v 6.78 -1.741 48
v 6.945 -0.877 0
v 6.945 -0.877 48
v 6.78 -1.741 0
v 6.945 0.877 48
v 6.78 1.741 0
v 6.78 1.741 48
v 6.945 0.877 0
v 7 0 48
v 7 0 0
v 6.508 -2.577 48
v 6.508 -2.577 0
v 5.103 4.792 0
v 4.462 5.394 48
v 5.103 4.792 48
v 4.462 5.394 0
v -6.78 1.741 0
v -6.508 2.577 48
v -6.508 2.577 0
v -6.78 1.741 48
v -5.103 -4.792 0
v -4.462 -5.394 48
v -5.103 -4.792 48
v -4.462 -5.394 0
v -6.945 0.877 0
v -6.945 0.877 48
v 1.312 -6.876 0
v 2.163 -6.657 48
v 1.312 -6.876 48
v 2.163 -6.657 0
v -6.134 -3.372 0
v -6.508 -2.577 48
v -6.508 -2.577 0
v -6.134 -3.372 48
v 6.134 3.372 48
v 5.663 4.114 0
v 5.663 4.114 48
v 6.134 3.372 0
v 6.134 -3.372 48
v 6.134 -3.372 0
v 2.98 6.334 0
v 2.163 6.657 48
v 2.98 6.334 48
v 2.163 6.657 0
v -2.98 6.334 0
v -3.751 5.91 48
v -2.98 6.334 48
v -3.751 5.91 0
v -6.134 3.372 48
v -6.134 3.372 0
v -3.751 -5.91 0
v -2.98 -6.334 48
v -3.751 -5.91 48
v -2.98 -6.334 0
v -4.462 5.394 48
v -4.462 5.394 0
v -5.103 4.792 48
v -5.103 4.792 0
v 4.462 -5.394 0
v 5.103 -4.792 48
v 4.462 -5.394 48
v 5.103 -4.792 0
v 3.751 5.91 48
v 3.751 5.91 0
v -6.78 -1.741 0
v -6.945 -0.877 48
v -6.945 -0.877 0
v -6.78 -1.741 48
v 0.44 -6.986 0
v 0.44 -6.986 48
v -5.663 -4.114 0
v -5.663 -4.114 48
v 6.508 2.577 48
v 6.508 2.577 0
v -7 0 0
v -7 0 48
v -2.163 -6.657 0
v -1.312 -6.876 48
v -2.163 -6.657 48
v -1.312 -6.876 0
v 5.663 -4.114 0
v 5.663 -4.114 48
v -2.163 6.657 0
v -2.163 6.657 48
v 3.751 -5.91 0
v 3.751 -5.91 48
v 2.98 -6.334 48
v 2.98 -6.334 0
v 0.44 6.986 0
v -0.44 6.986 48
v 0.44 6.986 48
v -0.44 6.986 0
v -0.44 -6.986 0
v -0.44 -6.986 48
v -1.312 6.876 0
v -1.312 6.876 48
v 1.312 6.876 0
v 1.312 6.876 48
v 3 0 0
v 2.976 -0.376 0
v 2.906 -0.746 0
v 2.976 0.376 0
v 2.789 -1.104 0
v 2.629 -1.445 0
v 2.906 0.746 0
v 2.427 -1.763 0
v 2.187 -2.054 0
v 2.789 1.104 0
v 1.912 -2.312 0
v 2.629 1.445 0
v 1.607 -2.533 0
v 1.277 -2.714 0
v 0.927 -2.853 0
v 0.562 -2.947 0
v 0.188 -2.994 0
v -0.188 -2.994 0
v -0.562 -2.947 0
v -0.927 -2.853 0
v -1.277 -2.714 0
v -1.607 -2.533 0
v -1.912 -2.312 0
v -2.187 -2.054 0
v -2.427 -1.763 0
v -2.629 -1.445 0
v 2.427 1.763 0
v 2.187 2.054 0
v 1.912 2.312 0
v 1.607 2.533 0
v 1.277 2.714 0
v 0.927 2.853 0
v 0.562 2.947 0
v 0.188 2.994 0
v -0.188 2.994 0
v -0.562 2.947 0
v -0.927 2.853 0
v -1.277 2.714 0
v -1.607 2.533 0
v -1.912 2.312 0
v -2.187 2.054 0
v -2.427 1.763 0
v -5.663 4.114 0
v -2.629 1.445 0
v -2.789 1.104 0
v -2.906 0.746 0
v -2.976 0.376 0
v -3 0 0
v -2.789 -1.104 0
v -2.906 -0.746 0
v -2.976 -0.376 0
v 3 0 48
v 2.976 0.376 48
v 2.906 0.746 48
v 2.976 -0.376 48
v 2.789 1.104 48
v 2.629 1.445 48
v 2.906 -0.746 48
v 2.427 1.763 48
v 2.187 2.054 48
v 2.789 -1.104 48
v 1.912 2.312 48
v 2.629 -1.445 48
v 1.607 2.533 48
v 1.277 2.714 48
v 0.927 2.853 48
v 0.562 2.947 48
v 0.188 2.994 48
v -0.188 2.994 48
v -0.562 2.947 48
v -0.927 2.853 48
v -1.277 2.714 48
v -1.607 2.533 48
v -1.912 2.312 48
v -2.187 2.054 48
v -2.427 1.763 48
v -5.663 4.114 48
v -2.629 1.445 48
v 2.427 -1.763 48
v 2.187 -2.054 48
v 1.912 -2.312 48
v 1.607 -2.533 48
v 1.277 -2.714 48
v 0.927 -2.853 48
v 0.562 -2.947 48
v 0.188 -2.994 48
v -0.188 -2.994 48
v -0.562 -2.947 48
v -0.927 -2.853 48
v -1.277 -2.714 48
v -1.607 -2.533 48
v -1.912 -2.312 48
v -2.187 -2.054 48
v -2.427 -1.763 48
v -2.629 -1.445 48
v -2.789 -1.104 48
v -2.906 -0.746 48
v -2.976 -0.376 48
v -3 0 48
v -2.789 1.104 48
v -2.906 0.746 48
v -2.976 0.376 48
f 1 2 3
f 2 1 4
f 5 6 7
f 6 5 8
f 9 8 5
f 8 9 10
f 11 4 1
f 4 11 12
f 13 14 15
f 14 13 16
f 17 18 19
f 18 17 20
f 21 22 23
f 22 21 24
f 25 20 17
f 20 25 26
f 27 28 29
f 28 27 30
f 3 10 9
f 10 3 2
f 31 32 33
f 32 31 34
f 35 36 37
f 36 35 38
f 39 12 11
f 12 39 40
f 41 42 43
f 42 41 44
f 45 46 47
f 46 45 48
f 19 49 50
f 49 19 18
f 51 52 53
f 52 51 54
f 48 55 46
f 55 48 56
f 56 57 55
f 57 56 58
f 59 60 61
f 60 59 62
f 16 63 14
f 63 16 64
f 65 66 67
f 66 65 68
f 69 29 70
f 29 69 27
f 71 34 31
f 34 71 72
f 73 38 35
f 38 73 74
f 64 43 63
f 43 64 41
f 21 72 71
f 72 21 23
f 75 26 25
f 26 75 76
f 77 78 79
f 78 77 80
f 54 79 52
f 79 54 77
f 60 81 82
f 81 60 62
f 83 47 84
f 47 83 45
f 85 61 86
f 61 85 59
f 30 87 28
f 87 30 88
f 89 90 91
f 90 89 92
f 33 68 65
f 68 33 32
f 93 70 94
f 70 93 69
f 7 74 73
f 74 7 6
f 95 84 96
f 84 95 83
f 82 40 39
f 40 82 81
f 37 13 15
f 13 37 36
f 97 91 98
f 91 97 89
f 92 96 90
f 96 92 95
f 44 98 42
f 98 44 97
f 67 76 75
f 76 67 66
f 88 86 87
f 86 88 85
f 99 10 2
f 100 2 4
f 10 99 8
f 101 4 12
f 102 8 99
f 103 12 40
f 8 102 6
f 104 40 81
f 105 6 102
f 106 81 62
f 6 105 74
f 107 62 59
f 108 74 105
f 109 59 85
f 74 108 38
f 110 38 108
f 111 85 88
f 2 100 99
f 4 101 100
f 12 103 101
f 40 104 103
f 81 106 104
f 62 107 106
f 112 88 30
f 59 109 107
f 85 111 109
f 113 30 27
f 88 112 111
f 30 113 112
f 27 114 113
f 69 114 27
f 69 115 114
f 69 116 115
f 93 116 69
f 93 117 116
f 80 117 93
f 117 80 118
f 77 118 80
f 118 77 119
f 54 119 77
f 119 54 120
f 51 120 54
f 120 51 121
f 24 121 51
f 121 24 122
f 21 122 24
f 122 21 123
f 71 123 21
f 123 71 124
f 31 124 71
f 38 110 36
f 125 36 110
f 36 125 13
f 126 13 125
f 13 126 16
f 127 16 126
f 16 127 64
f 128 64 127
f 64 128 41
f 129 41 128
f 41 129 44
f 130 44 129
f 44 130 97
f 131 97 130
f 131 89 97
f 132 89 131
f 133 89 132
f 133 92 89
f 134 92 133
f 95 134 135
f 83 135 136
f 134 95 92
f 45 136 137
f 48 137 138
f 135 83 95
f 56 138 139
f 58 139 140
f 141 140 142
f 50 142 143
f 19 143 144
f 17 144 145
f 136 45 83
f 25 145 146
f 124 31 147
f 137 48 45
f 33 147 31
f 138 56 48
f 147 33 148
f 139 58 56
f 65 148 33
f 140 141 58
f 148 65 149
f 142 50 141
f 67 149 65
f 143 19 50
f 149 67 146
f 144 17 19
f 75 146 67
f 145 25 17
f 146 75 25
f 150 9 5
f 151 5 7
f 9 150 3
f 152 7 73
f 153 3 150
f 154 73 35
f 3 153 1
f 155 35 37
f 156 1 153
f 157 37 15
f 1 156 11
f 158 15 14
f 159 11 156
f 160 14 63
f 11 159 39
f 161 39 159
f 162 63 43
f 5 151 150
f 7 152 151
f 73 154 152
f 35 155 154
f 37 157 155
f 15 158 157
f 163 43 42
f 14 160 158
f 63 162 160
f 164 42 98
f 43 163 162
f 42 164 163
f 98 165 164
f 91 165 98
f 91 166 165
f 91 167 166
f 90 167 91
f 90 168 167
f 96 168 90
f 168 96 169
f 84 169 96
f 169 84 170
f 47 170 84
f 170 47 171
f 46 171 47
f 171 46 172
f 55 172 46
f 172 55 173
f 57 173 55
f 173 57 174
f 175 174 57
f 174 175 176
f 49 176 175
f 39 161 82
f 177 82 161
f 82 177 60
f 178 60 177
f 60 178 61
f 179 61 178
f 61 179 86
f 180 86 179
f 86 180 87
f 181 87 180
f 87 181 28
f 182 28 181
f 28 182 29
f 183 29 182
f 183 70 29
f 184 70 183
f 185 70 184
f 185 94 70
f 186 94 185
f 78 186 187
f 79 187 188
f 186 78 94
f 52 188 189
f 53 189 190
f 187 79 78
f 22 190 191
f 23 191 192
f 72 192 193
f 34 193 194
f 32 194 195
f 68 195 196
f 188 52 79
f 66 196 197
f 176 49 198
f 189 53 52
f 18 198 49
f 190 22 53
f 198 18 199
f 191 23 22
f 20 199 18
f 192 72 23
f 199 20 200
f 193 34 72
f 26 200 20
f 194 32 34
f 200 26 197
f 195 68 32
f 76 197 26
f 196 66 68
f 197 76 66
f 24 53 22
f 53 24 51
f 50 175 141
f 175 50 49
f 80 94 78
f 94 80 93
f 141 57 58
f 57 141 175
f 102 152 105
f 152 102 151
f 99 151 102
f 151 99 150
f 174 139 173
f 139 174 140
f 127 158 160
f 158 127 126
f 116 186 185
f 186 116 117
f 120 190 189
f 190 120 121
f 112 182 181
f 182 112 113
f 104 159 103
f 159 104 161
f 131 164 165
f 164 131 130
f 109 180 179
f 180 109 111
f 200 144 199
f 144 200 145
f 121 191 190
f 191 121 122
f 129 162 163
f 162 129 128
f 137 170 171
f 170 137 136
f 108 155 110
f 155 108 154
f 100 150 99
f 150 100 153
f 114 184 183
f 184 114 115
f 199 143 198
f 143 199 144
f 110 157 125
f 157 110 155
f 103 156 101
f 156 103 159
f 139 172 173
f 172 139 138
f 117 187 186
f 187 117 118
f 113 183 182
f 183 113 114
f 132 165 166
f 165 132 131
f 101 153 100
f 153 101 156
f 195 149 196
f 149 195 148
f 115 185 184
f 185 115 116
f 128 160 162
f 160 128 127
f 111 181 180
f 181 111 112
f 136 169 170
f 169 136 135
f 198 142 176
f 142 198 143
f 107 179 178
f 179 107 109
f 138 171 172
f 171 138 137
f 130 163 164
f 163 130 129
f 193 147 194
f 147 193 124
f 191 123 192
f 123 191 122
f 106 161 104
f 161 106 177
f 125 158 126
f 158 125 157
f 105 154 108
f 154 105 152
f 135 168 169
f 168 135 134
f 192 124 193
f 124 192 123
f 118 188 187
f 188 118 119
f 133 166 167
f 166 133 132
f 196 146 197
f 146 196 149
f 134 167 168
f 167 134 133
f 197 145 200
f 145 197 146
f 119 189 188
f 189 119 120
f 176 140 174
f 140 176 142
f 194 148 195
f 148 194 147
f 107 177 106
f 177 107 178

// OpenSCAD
$fn = 50;


difference() {
	union() {
		cylinder(h = 48, r = 7.0000000000);
	}
	union() {
		translate(v = [0, 0, -100]) {
			cylinder(h = 200, r = 3.0000000000);
		}
	}
}
